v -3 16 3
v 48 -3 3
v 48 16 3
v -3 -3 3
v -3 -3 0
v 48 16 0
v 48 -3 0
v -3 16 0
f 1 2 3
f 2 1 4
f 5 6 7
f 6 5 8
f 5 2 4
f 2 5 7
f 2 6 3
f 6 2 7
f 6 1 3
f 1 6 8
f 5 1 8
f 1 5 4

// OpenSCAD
union() {
    // outer shell
    difference(){
        linear_extrude(file = "trace_ps1_controller.dxf", layer = "shell_outside", height = 10, center = false, convexity = 10);
        linear_extrude(file = "trace_ps1_controller.dxf", layer = "shell_inside", height = 12, center = false, convexity = 10);
    }
    // inner part for plugs
    difference(){
        linear_extrude(file = "trace_ps1_controller.dxf", layer = "plug_outside", height = 8, center = false, convexity = 10);
        linear_extrude(file = "trace_ps1_controller.dxf", layer = "plug_inside", height = 10, center = false, convexity = 10);
    }
    translate([-3,-3,0]) cube([51,19,3]);
}
